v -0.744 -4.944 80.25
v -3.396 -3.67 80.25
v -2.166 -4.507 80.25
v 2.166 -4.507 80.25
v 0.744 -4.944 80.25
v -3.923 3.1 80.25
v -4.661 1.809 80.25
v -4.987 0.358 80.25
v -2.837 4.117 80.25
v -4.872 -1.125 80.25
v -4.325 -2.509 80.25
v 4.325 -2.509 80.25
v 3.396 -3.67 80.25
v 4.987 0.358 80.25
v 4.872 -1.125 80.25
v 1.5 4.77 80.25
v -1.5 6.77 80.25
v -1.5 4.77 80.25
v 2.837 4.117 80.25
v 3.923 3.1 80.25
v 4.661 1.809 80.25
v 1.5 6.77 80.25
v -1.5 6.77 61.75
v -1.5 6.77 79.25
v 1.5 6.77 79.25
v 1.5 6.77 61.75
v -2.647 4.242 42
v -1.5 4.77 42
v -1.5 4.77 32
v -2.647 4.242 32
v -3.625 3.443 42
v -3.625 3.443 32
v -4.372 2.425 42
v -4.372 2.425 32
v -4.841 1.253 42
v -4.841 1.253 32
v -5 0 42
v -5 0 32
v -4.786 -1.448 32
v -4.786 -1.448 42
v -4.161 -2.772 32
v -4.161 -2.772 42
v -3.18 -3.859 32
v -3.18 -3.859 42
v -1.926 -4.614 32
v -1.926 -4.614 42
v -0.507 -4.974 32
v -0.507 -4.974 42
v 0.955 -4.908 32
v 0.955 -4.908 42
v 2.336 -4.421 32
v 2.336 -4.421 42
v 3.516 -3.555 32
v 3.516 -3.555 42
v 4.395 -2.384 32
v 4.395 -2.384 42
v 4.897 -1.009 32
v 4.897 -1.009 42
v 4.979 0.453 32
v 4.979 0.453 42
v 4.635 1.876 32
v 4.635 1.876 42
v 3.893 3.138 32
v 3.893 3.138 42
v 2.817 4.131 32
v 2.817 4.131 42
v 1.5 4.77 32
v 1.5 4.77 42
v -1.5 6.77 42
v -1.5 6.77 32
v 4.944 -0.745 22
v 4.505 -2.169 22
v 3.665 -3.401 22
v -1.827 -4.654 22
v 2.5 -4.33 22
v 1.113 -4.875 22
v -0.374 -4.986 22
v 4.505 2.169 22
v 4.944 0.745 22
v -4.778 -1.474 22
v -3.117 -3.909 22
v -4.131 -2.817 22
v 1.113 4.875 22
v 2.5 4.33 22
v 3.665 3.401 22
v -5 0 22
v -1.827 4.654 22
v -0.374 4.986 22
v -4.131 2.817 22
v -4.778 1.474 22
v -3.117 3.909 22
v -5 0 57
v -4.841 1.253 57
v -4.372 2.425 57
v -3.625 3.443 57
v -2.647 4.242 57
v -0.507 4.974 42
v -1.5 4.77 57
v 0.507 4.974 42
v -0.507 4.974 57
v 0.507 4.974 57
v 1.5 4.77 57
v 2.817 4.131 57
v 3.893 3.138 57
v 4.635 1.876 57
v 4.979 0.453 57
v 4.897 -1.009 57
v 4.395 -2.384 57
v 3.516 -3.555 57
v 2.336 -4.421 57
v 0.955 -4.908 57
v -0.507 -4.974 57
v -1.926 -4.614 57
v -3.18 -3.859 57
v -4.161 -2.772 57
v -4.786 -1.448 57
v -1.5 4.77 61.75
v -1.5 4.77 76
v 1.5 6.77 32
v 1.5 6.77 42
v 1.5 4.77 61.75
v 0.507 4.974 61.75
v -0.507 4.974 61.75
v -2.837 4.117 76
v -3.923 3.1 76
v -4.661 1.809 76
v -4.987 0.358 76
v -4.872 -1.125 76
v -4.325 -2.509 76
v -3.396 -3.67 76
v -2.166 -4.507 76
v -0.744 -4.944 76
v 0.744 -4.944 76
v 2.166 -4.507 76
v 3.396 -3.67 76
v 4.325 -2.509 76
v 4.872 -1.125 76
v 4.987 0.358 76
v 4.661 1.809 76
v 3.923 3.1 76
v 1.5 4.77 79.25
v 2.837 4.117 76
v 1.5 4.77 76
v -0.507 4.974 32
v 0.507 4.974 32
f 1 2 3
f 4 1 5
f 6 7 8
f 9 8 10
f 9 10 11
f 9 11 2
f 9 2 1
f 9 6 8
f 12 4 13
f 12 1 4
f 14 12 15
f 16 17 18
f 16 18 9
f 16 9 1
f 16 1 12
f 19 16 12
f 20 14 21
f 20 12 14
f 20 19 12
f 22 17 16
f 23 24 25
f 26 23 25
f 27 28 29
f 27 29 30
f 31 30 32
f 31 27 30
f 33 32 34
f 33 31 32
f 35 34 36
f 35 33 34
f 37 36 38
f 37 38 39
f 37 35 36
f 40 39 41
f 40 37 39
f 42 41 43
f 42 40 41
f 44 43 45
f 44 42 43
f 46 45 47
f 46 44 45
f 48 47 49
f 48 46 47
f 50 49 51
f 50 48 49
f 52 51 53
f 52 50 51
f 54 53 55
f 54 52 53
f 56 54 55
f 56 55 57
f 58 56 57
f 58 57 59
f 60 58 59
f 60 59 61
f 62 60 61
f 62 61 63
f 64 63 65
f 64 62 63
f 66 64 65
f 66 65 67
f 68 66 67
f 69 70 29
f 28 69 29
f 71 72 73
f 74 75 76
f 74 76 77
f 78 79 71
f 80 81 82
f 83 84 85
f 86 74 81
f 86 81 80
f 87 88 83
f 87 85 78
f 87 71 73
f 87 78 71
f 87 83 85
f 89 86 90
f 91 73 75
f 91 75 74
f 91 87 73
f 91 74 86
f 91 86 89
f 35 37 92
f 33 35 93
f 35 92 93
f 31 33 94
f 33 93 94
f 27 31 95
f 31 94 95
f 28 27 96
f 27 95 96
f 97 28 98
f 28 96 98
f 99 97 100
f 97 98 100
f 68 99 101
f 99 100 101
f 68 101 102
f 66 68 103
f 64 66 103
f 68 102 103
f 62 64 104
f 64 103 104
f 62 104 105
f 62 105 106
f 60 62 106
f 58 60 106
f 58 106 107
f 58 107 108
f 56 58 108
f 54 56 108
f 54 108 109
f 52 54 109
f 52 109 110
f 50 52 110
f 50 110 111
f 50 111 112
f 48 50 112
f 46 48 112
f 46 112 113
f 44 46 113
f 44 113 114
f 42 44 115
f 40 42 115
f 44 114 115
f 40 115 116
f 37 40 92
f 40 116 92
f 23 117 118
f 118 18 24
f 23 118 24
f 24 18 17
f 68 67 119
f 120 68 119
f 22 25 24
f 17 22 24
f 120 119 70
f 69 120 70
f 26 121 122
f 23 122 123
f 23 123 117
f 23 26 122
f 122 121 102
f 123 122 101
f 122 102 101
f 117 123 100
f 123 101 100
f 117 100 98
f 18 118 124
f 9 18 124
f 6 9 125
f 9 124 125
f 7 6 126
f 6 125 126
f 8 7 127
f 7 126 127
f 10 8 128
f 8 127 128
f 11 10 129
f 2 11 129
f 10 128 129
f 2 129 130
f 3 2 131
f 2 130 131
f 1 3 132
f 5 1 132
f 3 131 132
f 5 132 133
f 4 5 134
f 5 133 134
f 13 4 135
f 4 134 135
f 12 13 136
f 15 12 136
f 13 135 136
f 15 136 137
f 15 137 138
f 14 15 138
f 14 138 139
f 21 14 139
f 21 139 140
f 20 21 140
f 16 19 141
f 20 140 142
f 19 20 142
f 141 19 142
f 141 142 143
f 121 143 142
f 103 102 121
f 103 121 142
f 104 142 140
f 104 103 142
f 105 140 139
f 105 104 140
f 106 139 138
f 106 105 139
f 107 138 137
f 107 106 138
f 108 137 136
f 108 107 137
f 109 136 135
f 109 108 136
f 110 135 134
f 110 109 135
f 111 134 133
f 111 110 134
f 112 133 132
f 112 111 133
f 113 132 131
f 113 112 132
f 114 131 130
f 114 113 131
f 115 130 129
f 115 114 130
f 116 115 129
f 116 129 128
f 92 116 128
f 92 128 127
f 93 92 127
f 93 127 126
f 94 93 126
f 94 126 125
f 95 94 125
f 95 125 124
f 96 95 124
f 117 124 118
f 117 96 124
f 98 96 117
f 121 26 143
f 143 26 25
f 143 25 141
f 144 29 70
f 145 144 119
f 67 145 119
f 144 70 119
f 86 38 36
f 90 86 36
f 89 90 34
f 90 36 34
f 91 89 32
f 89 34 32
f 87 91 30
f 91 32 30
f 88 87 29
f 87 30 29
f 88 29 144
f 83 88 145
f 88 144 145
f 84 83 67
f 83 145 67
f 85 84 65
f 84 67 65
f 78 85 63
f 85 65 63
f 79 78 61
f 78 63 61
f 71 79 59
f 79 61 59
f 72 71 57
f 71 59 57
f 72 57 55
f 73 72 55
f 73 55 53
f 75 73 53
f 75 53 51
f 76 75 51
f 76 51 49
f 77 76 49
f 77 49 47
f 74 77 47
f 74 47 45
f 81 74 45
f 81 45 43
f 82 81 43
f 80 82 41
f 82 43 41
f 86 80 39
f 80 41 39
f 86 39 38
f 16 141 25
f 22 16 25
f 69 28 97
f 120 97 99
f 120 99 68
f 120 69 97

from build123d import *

# Parameters (mm, degrees)
SKETCH1_R            = 5
BOSS_EXTRUDE1_DEPTH  = 20
BOSS_EXTRUDE2_DEPTH  = 10
SKETCH4_R            = 5
BOSS_EXTRUDE3_DEPTH  = 27
BOSS_EXTRUDE4_DEPTH  = 19
SKETCH6_R            = 5
BOSS_EXTRUDE5_DEPTH  = 30
SKETCH7_R            = 5
CUT_EXTRUDE1_DEPTH   = 10
SKETCH8_R            = 6.933887
CUT_EXTRUDE2_DEPTH   = 35
SKETCH9_R            = 5
CUT_EXTRUDE3_DEPTH   = 12
SKETCH10_R           = 5
BOSS_EXTRUDE8_DEPTH  = 15
BOSS_EXTRUDE9_DEPTH  = 10
SKETCH12_R           = 5
BOSS_EXTRUDE10_DEPTH = 10
SKETCH13_R           = 5
CUT_EXTRUDE4_DEPTH   = 28
SKETCH20_R           = 5
CUT_EXTRUDE5_DEPTH   = 2
BOSS_EXTRUDE11_DEPTH = 4.25
CUT_EXTRUDE6_DEPTH   = 22.25
BOSS_EXTRUDE12_DEPTH = 17.5


with BuildPart() as part:
    # Sketch1 → Boss-Extrude1 (new body)
    with BuildSketch(Plane.XY):
        Circle(SKETCH1_R)
    extrude(amount=BOSS_EXTRUDE1_DEPTH)

    # Sketch3 → Boss-Extrude2 (add)
    with BuildSketch(Plane.XY.offset(20)):
        with BuildLine():
            Line((1.5, 6.769696), (-1.5, 6.769696))
            Line((-1.5, 6.769696), (-1.5, 4.769696))
            ThreePointArc((-1.5, 4.769696), (0, -5), (1.5, 4.769696))
            Line((1.5, 4.769696), (1.5, 6.769696))
        make_face()
    extrude(amount=BOSS_EXTRUDE2_DEPTH)

    # Sketch4 → Boss-Extrude3 (add)
    with BuildSketch(Plane.XY.offset(30)):
        Circle(SKETCH4_R)
    extrude(amount=BOSS_EXTRUDE3_DEPTH)

    # Sketch5 → Boss-Extrude4 (add)
    with BuildSketch(Plane.XY.offset(57)):
        with BuildLine():
            Line((-1.5, 4.769696), (-1.5, 6.769696))
            Line((-1.5, 6.769696), (1.5, 6.769696))
            Line((1.5, 6.769696), (1.5, 4.769696))
            ThreePointArc((1.5, 4.769696), (0, -5), (-1.5, 4.769696))
        make_face()
    extrude(amount=BOSS_EXTRUDE4_DEPTH)

    # Sketch6 → Boss-Extrude5 (add)
    with BuildSketch(Plane.XY.offset(76)):
        Circle(SKETCH6_R)
    extrude(amount=BOSS_EXTRUDE5_DEPTH)

    # Sketch7 → Cut-Extrude1 (cut)
    with BuildSketch(Plane(origin=(0, 0, 0), x_dir=(-1, 0, 0), z_dir=(0, 0, -1))):
        Circle(SKETCH7_R)
    extrude(amount=-CUT_EXTRUDE1_DEPTH, mode=Mode.SUBTRACT)

    # Sketch8 → Cut-Extrude2 (cut)
    with BuildSketch(Plane(origin=(0, 0, 10), x_dir=(-1, 0, 0), z_dir=(0, 0, -1))):
        Circle(SKETCH8_R)
    extrude(amount=-CUT_EXTRUDE2_DEPTH, mode=Mode.SUBTRACT)

    # Sketch9 → Cut-Extrude3 (cut)
    with BuildSketch(Plane(origin=(0, 0, 45), x_dir=(-1, 0, 0), z_dir=(0, 0, -1))):
        with Locations(Location((0, 0, 0), (0, 0, 72.542397))):
            Circle(SKETCH9_R)
    extrude(amount=-CUT_EXTRUDE3_DEPTH, mode=Mode.SUBTRACT)

    # Sketch10 → Boss-Extrude8 (add)
    with BuildSketch(Plane(origin=(0, 0, 57), x_dir=(-1, 0, 0), z_dir=(0, 0, -1))):
        Circle(SKETCH10_R)
    extrude(amount=BOSS_EXTRUDE8_DEPTH)

    # Sketch11 → Boss-Extrude9 (add)
    with BuildSketch(Plane(origin=(0, 0, 42), x_dir=(-1, 0, 0), z_dir=(0, 0, -1))):
        with BuildLine():
            Line((-1.5, 6.769696), (1.5, 6.769696))
            Line((1.5, 6.769696), (1.5, 4.769696))
            ThreePointArc((1.5, 4.769696), (0, -5), (-1.5, 4.769696))
            Line((-1.5, 4.769696), (-1.5, 6.769696))
        make_face()
    extrude(amount=BOSS_EXTRUDE9_DEPTH)

    # Sketch12 → Boss-Extrude10 (add)
    with BuildSketch(Plane(origin=(0, 0, 32), x_dir=(-1, 0, 0), z_dir=(0, 0, -1))):
        Circle(SKETCH12_R)
    extrude(amount=BOSS_EXTRUDE10_DEPTH)

    # Sketch13 → Cut-Extrude4 (cut)
    with BuildSketch(Plane.XY.offset(106)):
        with Locations(Location((0, 0, 0), (0, 0, 180))):
            Circle(SKETCH13_R)
    extrude(amount=-CUT_EXTRUDE4_DEPTH, mode=Mode.SUBTRACT)

    # Sketch20 → Cut-Extrude5 (cut)
    with BuildSketch(Plane.XY.offset(78)):
        with Locations(Location((0, 0, 0), (0, 0, 180))):
            Circle(SKETCH20_R)
    extrude(amount=-CUT_EXTRUDE5_DEPTH, mode=Mode.SUBTRACT)

    # Sketch21 → Boss-Extrude11 (add)
    with BuildSketch(Plane.XY.offset(76)):
        with BuildLine():
            Line((1.5, 4.769696), (1.5, 6.769696))
            Line((1.5, 6.769696), (-1.5, 6.769696))
            Line((-1.5, 6.769696), (-1.5, 4.769696))
            ThreePointArc((-1.5, 4.769696), (0, -5), (1.5, 4.769696))
        make_face()
    extrude(amount=BOSS_EXTRUDE11_DEPTH)

    # Sketch22 → Cut-Extrude6 (cut)
    with BuildSketch(Plane(origin=(0, 0, 57), x_dir=(-1, 0, 0), z_dir=(0, 0, -1))):
        with BuildLine():
            Line((1.5, 4.769696), (1.5, 6.769696))
            Line((1.5, 6.769696), (-1.5, 6.769696))
            Line((-1.5, 6.769696), (-1.5, 4.769696))
            ThreePointArc((-1.5, 4.769696), (0, 5), (1.5, 4.769696))
        make_face()
    extrude(amount=-CUT_EXTRUDE6_DEPTH, mode=Mode.SUBTRACT)

    # Sketch23 → Boss-Extrude12 (add)
    with BuildSketch(Plane(origin=(0, 0, 79.25), x_dir=(-1, 0, 0), z_dir=(0, 0, -1))):
        with BuildLine():
            Line((1.5, 4.769696), (1.5, 6.769696))
            Line((1.5, 6.769696), (-1.5, 6.769696))
            Line((-1.5, 6.769696), (-1.5, 4.769696))
            ThreePointArc((-1.5, 4.769696), (0, 5), (1.5, 4.769696))
        make_face()
    extrude(amount=BOSS_EXTRUDE12_DEPTH)


solid = part.part
